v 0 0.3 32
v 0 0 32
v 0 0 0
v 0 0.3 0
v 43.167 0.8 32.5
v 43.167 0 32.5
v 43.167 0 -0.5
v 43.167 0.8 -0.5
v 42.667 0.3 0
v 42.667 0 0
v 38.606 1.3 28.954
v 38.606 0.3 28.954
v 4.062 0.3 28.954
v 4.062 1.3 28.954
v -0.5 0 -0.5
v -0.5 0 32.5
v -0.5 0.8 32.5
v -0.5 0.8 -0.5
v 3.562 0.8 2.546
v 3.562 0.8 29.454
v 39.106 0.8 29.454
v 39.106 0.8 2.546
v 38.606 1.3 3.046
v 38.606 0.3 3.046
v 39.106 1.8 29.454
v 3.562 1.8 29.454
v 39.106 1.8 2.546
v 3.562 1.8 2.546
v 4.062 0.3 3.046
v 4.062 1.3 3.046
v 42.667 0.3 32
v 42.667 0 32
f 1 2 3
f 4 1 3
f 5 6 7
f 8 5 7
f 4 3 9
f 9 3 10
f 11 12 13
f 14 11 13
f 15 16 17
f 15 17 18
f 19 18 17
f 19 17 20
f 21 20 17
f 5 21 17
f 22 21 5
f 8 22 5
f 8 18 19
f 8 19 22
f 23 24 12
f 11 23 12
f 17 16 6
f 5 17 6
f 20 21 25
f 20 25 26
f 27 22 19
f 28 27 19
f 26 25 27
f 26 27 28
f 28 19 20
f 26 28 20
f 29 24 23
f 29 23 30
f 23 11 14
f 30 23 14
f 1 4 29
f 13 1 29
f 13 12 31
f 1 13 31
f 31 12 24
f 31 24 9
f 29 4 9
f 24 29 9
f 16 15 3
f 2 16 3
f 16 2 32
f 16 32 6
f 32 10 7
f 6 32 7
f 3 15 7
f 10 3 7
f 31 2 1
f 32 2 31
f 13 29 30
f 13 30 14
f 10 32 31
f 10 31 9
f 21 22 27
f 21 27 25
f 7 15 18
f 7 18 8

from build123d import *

# Parameters (mm, degrees)
SKETCH1_W      = 42.667
SKETCH1_H      = 32
EXTRUDE1_DEPTH = 0.3
SKETCH2_W      = 34.544
SKETCH2_H      = 25.908
EXTRUDE2_DEPTH = 1
SHELL1_T       = 0.5


with BuildPart() as part:
    # Sketch1 → Extrude1 (new body)
    with BuildSketch(Plane(origin=(0, 0, 0), x_dir=(1, 0, 0), z_dir=(0, 1, 0))):
        with Locations((21.3335, -16)):
            Rectangle(SKETCH1_W, SKETCH1_H)
    extrude(amount=EXTRUDE1_DEPTH)

    # Sketch2 → Extrude2 (add)
    with BuildSketch(Plane(origin=(0, 0.3, 0), x_dir=(-1, 0, 0), z_dir=(0, 1, 0))):
        with Locations((-21.3335, 16)):
            Rectangle(SKETCH2_W, SKETCH2_H)
    extrude(amount=EXTRUDE2_DEPTH)

    # Shell1
    shell1_openings = [part.faces().sort_by_distance(p)[0] for p in [
        (21.3335, 0, 16),
    ]]
    offset(amount=SHELL1_T, openings=shell1_openings, kind=Kind.INTERSECTION)


solid = part.part
